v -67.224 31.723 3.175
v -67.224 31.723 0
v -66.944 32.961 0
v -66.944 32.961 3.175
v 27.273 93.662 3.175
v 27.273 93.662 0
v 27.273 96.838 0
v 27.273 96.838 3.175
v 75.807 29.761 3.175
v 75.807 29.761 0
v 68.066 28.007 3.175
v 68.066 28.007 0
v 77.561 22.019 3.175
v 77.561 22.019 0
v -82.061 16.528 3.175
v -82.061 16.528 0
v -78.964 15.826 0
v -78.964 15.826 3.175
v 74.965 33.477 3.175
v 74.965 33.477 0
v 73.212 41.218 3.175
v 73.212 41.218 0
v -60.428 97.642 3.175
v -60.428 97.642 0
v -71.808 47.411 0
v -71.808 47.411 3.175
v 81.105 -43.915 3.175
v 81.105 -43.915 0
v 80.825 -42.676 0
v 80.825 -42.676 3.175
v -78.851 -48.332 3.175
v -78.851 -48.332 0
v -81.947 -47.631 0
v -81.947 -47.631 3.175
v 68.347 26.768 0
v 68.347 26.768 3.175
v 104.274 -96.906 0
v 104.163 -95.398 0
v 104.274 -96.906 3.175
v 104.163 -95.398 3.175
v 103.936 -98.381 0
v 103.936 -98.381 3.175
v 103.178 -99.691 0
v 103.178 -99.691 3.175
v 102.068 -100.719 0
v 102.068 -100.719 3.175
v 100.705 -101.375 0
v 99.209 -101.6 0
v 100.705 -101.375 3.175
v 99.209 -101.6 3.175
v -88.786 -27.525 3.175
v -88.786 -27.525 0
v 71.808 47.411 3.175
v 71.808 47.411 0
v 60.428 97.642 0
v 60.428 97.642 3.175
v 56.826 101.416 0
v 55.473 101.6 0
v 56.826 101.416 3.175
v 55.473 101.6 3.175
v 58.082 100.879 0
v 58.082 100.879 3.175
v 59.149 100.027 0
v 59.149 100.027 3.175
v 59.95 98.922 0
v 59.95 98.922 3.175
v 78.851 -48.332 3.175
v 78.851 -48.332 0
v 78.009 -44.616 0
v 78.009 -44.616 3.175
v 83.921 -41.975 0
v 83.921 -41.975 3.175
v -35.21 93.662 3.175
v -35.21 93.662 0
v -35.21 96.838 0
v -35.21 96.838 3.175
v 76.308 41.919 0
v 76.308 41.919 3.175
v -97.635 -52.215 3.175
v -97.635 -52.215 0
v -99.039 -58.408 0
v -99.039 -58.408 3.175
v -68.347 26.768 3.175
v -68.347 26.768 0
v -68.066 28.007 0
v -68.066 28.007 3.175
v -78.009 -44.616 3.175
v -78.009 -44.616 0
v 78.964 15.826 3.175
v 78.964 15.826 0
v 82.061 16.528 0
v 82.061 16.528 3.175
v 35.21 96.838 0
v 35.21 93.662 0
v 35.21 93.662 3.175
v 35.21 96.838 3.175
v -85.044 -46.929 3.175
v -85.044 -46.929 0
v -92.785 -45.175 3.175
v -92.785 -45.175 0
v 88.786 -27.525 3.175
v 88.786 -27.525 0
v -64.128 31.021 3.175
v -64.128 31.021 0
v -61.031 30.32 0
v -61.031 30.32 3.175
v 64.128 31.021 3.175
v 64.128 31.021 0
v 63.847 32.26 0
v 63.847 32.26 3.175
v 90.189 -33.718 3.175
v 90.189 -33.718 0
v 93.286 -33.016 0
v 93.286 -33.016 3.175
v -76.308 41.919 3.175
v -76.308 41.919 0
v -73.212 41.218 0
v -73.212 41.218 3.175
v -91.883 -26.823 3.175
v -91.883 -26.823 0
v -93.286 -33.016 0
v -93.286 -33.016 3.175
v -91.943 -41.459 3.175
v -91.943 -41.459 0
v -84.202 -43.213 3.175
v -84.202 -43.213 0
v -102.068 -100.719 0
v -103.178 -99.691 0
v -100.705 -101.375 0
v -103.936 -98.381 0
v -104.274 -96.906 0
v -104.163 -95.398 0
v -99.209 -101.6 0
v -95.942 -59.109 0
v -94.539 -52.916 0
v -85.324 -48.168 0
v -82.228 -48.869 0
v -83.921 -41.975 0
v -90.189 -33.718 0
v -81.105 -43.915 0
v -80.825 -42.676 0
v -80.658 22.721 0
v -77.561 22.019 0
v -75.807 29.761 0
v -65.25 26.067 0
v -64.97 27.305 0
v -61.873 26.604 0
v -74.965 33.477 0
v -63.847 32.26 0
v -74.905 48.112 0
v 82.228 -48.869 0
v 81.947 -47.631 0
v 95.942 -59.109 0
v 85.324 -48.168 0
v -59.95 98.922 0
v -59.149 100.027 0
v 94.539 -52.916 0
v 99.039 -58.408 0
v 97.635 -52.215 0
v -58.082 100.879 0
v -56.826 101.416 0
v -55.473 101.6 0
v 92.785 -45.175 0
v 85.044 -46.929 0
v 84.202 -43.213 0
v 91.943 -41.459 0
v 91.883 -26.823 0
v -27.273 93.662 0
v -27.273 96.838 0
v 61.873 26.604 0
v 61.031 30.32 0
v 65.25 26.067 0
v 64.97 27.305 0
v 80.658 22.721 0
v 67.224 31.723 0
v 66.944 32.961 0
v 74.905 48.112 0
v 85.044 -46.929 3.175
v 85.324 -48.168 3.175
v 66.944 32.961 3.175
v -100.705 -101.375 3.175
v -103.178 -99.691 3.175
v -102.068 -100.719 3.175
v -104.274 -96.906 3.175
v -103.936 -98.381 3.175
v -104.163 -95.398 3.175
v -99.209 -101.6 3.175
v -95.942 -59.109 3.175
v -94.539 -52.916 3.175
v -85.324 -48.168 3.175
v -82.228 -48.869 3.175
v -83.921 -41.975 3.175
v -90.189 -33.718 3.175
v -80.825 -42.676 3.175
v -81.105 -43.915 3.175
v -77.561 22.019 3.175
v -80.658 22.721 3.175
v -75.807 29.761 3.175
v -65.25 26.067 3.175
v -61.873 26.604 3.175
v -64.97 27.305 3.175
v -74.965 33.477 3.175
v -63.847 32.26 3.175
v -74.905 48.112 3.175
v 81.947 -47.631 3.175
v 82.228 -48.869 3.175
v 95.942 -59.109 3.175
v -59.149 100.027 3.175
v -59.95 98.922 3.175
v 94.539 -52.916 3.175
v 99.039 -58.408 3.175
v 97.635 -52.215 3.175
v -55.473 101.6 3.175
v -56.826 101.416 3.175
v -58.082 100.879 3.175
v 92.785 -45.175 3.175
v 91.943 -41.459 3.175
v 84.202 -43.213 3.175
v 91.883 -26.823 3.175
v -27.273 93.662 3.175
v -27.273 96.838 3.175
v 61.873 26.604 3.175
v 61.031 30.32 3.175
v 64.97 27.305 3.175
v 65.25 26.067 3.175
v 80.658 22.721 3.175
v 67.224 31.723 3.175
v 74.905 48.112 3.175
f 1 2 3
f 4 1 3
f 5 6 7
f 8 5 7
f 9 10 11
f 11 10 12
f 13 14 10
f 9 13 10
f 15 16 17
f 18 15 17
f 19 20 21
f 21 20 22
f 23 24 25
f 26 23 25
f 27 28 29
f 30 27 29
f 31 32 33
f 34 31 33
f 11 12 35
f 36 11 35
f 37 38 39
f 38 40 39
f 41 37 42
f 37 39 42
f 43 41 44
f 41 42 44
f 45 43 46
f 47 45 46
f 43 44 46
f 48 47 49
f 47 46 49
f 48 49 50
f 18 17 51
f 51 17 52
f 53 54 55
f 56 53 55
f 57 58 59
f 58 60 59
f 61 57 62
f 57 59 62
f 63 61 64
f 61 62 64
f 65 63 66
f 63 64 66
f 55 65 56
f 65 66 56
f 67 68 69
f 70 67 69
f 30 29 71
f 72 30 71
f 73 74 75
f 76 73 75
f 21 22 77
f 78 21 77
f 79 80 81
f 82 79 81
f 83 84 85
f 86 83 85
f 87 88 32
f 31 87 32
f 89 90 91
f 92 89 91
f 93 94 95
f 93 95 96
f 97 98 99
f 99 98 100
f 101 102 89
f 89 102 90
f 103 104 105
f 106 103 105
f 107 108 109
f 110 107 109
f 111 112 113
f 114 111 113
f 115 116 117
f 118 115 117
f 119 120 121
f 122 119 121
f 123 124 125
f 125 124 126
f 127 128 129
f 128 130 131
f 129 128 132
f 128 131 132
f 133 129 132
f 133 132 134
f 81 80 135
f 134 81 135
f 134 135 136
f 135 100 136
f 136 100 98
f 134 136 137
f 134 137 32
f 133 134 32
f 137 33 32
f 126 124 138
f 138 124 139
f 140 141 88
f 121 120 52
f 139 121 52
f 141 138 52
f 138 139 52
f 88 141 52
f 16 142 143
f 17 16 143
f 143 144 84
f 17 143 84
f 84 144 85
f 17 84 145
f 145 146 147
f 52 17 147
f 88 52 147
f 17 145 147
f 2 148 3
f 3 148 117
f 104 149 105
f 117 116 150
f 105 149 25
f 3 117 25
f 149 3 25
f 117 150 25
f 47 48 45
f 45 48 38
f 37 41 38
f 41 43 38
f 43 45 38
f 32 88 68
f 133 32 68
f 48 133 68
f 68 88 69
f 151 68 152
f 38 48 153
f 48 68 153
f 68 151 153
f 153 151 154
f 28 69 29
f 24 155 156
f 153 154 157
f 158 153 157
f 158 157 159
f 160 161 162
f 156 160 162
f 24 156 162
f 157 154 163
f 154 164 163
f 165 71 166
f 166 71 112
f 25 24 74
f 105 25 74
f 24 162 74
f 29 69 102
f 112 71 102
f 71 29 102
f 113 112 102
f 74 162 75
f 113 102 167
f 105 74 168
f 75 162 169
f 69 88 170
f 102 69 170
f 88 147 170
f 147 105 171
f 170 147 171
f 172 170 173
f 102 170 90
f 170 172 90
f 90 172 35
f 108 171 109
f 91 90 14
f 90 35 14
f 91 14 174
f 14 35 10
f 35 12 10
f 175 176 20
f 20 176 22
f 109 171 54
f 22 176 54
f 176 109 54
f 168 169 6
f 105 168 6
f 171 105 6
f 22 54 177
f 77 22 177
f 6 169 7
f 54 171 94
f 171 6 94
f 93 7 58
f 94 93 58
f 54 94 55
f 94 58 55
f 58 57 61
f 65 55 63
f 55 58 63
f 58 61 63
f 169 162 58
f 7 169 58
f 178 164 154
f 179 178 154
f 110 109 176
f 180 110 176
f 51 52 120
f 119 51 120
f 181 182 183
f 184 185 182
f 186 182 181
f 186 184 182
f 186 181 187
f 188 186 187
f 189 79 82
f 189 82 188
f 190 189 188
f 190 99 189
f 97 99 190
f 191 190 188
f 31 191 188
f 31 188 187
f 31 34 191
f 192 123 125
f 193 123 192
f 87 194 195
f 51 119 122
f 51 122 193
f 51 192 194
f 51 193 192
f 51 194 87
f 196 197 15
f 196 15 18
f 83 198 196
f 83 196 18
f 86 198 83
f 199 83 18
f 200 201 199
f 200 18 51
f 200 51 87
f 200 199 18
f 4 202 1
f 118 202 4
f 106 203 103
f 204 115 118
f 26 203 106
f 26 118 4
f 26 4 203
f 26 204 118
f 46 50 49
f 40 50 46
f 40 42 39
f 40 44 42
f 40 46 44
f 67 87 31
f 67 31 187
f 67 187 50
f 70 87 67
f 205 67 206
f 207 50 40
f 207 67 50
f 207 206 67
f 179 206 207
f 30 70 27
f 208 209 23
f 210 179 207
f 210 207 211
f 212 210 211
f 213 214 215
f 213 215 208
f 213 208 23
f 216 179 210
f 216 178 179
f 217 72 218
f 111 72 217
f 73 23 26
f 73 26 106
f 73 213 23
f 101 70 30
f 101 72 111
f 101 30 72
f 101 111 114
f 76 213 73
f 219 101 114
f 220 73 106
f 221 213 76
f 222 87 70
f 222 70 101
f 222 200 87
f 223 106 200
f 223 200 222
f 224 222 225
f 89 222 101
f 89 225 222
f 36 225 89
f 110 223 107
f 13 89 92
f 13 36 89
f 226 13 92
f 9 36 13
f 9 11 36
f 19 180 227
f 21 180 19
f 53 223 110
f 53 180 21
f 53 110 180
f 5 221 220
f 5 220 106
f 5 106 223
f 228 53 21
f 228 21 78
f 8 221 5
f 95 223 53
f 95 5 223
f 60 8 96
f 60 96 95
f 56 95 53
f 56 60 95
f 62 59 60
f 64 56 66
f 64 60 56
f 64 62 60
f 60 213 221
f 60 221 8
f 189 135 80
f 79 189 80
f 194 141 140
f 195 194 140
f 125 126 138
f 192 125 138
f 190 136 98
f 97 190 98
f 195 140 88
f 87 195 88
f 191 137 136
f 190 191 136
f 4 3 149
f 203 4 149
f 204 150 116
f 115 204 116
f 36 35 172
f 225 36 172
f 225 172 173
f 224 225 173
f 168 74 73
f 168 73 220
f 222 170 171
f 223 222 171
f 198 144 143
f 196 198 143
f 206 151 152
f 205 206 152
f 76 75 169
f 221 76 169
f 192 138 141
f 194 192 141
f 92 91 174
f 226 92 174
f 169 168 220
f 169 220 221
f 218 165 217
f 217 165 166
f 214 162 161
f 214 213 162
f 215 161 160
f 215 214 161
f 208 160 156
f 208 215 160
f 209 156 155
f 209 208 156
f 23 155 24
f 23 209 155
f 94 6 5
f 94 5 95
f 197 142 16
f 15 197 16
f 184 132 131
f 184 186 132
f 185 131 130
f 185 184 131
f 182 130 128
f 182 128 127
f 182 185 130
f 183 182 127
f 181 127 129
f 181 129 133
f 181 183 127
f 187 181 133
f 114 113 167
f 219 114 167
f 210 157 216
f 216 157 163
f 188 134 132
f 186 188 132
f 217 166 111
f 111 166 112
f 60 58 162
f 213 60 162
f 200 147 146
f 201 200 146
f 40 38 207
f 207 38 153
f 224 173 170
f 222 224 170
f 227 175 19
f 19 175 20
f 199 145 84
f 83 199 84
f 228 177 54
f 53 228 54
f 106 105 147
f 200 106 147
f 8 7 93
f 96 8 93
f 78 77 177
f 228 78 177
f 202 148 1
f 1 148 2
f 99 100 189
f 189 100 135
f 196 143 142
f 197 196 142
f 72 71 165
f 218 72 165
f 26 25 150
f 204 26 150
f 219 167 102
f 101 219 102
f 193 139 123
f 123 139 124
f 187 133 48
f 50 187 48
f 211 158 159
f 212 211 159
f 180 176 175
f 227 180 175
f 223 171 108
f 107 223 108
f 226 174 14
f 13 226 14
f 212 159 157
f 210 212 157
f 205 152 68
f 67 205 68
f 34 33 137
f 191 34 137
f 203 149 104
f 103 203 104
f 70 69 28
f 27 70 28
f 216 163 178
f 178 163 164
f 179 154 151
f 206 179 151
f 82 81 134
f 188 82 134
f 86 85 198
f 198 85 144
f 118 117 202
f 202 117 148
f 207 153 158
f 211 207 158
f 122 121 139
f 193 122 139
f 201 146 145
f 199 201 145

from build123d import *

# Parameters (mm, degrees)
F0_W     = 7.9375
F0_H     = 3.175
F1_DEPTH = 3.175
F2_R     = 5.08


with BuildPart() as f1:
    # F0 (on Top) → F1 (new body)
    with BuildSketch(Plane.XY):
        Polygon((59.53125, 101.6), (-59.53125, 101.6), (-71.808473, 47.410876), (-74.904995, 48.112431), (-76.308106, 41.919389), (-73.211585, 41.217833), (-74.965474, 33.476529), (-67.22417, 31.72264), (-66.943548, 32.961249), (-63.847027, 32.259693), (-64.127649, 31.021085), (-61.031128, 30.319529), (-61.872994, 26.603703), (-64.969516, 27.305259), (-65.250138, 26.066651), (-68.346659, 26.768206), (-68.066037, 28.006815), (-75.807341, 29.760704), (-77.56123, 22.0194), (-80.657751, 22.720956), (-82.060862, 16.527913), (-78.964341, 15.826358), (-88.78612, -27.524942), (-91.882641, -26.823386), (-93.285752, -33.016429), (-90.189231, -33.717985), (-91.94312, -41.459288), (-84.201816, -43.213177), (-83.921194, -41.974569), (-80.824673, -42.676124), (-81.105295, -43.914733), (-78.008774, -44.616288), (-78.85064, -48.332114), (-81.947162, -47.630558), (-82.227784, -48.869167), (-85.324305, -48.167611), (-85.043683, -46.929003), (-92.784987, -45.175114), (-94.538876, -52.916417), (-97.635397, -52.214862), (-99.038508, -58.407904), (-95.941987, -59.10946), (-105.56875, -101.6), (105.56875, -101.6), (95.941987, -59.10946), (99.038508, -58.407904), (97.635397, -52.214862), (94.538876, -52.916417), (92.784987, -45.175114), (85.043683, -46.929003), (85.324305, -48.167611), (82.227784, -48.869167), (81.947162, -47.630558), (78.85064, -48.332114), (78.008774, -44.616288), (81.105295, -43.914733), (80.824673, -42.676124), (83.921194, -41.974569), (84.201816, -43.213177), (91.94312, -41.459288), (90.189231, -33.717985), (93.285752, -33.016429), (91.882641, -26.823386), (88.78612, -27.524942), (78.964341, 15.826358), (82.060862, 16.527913), (80.657751, 22.720956), (77.56123, 22.0194), (75.807341, 29.760704), (68.066037, 28.006815), (68.346659, 26.768206), (65.250138, 26.066651), (64.969516, 27.305259), (61.872994, 26.603703), (61.031128, 30.319529), (64.127649, 31.021085), (63.847027, 32.259693), (66.943548, 32.961249), (67.22417, 31.72264), (74.965474, 33.476529), (73.211585, 41.217833), (76.308106, 41.919389), (74.904995, 48.112431), (71.808473, 47.410876), align=None)
        with Locations((-31.241504, 95.25)):
            Rectangle(F0_W, F0_H, mode=Mode.SUBTRACT)
        with Locations((31.241504, 95.25)):
            Rectangle(F0_W, F0_H, mode=Mode.SUBTRACT)
    extrude(amount=F1_DEPTH)

    # F2
    f2_edges = [f1.edges().sort_by_distance(p)[0] for p in [
        (-59.53125, 101.6, 1.5875),
        (59.53125, 101.6, 1.5875),
        (105.56875, -101.6, 1.5875),
        (-105.56875, -101.6, 1.5875),
    ]]
    fillet(f2_edges, radius=F2_R)


solid = f1.part
